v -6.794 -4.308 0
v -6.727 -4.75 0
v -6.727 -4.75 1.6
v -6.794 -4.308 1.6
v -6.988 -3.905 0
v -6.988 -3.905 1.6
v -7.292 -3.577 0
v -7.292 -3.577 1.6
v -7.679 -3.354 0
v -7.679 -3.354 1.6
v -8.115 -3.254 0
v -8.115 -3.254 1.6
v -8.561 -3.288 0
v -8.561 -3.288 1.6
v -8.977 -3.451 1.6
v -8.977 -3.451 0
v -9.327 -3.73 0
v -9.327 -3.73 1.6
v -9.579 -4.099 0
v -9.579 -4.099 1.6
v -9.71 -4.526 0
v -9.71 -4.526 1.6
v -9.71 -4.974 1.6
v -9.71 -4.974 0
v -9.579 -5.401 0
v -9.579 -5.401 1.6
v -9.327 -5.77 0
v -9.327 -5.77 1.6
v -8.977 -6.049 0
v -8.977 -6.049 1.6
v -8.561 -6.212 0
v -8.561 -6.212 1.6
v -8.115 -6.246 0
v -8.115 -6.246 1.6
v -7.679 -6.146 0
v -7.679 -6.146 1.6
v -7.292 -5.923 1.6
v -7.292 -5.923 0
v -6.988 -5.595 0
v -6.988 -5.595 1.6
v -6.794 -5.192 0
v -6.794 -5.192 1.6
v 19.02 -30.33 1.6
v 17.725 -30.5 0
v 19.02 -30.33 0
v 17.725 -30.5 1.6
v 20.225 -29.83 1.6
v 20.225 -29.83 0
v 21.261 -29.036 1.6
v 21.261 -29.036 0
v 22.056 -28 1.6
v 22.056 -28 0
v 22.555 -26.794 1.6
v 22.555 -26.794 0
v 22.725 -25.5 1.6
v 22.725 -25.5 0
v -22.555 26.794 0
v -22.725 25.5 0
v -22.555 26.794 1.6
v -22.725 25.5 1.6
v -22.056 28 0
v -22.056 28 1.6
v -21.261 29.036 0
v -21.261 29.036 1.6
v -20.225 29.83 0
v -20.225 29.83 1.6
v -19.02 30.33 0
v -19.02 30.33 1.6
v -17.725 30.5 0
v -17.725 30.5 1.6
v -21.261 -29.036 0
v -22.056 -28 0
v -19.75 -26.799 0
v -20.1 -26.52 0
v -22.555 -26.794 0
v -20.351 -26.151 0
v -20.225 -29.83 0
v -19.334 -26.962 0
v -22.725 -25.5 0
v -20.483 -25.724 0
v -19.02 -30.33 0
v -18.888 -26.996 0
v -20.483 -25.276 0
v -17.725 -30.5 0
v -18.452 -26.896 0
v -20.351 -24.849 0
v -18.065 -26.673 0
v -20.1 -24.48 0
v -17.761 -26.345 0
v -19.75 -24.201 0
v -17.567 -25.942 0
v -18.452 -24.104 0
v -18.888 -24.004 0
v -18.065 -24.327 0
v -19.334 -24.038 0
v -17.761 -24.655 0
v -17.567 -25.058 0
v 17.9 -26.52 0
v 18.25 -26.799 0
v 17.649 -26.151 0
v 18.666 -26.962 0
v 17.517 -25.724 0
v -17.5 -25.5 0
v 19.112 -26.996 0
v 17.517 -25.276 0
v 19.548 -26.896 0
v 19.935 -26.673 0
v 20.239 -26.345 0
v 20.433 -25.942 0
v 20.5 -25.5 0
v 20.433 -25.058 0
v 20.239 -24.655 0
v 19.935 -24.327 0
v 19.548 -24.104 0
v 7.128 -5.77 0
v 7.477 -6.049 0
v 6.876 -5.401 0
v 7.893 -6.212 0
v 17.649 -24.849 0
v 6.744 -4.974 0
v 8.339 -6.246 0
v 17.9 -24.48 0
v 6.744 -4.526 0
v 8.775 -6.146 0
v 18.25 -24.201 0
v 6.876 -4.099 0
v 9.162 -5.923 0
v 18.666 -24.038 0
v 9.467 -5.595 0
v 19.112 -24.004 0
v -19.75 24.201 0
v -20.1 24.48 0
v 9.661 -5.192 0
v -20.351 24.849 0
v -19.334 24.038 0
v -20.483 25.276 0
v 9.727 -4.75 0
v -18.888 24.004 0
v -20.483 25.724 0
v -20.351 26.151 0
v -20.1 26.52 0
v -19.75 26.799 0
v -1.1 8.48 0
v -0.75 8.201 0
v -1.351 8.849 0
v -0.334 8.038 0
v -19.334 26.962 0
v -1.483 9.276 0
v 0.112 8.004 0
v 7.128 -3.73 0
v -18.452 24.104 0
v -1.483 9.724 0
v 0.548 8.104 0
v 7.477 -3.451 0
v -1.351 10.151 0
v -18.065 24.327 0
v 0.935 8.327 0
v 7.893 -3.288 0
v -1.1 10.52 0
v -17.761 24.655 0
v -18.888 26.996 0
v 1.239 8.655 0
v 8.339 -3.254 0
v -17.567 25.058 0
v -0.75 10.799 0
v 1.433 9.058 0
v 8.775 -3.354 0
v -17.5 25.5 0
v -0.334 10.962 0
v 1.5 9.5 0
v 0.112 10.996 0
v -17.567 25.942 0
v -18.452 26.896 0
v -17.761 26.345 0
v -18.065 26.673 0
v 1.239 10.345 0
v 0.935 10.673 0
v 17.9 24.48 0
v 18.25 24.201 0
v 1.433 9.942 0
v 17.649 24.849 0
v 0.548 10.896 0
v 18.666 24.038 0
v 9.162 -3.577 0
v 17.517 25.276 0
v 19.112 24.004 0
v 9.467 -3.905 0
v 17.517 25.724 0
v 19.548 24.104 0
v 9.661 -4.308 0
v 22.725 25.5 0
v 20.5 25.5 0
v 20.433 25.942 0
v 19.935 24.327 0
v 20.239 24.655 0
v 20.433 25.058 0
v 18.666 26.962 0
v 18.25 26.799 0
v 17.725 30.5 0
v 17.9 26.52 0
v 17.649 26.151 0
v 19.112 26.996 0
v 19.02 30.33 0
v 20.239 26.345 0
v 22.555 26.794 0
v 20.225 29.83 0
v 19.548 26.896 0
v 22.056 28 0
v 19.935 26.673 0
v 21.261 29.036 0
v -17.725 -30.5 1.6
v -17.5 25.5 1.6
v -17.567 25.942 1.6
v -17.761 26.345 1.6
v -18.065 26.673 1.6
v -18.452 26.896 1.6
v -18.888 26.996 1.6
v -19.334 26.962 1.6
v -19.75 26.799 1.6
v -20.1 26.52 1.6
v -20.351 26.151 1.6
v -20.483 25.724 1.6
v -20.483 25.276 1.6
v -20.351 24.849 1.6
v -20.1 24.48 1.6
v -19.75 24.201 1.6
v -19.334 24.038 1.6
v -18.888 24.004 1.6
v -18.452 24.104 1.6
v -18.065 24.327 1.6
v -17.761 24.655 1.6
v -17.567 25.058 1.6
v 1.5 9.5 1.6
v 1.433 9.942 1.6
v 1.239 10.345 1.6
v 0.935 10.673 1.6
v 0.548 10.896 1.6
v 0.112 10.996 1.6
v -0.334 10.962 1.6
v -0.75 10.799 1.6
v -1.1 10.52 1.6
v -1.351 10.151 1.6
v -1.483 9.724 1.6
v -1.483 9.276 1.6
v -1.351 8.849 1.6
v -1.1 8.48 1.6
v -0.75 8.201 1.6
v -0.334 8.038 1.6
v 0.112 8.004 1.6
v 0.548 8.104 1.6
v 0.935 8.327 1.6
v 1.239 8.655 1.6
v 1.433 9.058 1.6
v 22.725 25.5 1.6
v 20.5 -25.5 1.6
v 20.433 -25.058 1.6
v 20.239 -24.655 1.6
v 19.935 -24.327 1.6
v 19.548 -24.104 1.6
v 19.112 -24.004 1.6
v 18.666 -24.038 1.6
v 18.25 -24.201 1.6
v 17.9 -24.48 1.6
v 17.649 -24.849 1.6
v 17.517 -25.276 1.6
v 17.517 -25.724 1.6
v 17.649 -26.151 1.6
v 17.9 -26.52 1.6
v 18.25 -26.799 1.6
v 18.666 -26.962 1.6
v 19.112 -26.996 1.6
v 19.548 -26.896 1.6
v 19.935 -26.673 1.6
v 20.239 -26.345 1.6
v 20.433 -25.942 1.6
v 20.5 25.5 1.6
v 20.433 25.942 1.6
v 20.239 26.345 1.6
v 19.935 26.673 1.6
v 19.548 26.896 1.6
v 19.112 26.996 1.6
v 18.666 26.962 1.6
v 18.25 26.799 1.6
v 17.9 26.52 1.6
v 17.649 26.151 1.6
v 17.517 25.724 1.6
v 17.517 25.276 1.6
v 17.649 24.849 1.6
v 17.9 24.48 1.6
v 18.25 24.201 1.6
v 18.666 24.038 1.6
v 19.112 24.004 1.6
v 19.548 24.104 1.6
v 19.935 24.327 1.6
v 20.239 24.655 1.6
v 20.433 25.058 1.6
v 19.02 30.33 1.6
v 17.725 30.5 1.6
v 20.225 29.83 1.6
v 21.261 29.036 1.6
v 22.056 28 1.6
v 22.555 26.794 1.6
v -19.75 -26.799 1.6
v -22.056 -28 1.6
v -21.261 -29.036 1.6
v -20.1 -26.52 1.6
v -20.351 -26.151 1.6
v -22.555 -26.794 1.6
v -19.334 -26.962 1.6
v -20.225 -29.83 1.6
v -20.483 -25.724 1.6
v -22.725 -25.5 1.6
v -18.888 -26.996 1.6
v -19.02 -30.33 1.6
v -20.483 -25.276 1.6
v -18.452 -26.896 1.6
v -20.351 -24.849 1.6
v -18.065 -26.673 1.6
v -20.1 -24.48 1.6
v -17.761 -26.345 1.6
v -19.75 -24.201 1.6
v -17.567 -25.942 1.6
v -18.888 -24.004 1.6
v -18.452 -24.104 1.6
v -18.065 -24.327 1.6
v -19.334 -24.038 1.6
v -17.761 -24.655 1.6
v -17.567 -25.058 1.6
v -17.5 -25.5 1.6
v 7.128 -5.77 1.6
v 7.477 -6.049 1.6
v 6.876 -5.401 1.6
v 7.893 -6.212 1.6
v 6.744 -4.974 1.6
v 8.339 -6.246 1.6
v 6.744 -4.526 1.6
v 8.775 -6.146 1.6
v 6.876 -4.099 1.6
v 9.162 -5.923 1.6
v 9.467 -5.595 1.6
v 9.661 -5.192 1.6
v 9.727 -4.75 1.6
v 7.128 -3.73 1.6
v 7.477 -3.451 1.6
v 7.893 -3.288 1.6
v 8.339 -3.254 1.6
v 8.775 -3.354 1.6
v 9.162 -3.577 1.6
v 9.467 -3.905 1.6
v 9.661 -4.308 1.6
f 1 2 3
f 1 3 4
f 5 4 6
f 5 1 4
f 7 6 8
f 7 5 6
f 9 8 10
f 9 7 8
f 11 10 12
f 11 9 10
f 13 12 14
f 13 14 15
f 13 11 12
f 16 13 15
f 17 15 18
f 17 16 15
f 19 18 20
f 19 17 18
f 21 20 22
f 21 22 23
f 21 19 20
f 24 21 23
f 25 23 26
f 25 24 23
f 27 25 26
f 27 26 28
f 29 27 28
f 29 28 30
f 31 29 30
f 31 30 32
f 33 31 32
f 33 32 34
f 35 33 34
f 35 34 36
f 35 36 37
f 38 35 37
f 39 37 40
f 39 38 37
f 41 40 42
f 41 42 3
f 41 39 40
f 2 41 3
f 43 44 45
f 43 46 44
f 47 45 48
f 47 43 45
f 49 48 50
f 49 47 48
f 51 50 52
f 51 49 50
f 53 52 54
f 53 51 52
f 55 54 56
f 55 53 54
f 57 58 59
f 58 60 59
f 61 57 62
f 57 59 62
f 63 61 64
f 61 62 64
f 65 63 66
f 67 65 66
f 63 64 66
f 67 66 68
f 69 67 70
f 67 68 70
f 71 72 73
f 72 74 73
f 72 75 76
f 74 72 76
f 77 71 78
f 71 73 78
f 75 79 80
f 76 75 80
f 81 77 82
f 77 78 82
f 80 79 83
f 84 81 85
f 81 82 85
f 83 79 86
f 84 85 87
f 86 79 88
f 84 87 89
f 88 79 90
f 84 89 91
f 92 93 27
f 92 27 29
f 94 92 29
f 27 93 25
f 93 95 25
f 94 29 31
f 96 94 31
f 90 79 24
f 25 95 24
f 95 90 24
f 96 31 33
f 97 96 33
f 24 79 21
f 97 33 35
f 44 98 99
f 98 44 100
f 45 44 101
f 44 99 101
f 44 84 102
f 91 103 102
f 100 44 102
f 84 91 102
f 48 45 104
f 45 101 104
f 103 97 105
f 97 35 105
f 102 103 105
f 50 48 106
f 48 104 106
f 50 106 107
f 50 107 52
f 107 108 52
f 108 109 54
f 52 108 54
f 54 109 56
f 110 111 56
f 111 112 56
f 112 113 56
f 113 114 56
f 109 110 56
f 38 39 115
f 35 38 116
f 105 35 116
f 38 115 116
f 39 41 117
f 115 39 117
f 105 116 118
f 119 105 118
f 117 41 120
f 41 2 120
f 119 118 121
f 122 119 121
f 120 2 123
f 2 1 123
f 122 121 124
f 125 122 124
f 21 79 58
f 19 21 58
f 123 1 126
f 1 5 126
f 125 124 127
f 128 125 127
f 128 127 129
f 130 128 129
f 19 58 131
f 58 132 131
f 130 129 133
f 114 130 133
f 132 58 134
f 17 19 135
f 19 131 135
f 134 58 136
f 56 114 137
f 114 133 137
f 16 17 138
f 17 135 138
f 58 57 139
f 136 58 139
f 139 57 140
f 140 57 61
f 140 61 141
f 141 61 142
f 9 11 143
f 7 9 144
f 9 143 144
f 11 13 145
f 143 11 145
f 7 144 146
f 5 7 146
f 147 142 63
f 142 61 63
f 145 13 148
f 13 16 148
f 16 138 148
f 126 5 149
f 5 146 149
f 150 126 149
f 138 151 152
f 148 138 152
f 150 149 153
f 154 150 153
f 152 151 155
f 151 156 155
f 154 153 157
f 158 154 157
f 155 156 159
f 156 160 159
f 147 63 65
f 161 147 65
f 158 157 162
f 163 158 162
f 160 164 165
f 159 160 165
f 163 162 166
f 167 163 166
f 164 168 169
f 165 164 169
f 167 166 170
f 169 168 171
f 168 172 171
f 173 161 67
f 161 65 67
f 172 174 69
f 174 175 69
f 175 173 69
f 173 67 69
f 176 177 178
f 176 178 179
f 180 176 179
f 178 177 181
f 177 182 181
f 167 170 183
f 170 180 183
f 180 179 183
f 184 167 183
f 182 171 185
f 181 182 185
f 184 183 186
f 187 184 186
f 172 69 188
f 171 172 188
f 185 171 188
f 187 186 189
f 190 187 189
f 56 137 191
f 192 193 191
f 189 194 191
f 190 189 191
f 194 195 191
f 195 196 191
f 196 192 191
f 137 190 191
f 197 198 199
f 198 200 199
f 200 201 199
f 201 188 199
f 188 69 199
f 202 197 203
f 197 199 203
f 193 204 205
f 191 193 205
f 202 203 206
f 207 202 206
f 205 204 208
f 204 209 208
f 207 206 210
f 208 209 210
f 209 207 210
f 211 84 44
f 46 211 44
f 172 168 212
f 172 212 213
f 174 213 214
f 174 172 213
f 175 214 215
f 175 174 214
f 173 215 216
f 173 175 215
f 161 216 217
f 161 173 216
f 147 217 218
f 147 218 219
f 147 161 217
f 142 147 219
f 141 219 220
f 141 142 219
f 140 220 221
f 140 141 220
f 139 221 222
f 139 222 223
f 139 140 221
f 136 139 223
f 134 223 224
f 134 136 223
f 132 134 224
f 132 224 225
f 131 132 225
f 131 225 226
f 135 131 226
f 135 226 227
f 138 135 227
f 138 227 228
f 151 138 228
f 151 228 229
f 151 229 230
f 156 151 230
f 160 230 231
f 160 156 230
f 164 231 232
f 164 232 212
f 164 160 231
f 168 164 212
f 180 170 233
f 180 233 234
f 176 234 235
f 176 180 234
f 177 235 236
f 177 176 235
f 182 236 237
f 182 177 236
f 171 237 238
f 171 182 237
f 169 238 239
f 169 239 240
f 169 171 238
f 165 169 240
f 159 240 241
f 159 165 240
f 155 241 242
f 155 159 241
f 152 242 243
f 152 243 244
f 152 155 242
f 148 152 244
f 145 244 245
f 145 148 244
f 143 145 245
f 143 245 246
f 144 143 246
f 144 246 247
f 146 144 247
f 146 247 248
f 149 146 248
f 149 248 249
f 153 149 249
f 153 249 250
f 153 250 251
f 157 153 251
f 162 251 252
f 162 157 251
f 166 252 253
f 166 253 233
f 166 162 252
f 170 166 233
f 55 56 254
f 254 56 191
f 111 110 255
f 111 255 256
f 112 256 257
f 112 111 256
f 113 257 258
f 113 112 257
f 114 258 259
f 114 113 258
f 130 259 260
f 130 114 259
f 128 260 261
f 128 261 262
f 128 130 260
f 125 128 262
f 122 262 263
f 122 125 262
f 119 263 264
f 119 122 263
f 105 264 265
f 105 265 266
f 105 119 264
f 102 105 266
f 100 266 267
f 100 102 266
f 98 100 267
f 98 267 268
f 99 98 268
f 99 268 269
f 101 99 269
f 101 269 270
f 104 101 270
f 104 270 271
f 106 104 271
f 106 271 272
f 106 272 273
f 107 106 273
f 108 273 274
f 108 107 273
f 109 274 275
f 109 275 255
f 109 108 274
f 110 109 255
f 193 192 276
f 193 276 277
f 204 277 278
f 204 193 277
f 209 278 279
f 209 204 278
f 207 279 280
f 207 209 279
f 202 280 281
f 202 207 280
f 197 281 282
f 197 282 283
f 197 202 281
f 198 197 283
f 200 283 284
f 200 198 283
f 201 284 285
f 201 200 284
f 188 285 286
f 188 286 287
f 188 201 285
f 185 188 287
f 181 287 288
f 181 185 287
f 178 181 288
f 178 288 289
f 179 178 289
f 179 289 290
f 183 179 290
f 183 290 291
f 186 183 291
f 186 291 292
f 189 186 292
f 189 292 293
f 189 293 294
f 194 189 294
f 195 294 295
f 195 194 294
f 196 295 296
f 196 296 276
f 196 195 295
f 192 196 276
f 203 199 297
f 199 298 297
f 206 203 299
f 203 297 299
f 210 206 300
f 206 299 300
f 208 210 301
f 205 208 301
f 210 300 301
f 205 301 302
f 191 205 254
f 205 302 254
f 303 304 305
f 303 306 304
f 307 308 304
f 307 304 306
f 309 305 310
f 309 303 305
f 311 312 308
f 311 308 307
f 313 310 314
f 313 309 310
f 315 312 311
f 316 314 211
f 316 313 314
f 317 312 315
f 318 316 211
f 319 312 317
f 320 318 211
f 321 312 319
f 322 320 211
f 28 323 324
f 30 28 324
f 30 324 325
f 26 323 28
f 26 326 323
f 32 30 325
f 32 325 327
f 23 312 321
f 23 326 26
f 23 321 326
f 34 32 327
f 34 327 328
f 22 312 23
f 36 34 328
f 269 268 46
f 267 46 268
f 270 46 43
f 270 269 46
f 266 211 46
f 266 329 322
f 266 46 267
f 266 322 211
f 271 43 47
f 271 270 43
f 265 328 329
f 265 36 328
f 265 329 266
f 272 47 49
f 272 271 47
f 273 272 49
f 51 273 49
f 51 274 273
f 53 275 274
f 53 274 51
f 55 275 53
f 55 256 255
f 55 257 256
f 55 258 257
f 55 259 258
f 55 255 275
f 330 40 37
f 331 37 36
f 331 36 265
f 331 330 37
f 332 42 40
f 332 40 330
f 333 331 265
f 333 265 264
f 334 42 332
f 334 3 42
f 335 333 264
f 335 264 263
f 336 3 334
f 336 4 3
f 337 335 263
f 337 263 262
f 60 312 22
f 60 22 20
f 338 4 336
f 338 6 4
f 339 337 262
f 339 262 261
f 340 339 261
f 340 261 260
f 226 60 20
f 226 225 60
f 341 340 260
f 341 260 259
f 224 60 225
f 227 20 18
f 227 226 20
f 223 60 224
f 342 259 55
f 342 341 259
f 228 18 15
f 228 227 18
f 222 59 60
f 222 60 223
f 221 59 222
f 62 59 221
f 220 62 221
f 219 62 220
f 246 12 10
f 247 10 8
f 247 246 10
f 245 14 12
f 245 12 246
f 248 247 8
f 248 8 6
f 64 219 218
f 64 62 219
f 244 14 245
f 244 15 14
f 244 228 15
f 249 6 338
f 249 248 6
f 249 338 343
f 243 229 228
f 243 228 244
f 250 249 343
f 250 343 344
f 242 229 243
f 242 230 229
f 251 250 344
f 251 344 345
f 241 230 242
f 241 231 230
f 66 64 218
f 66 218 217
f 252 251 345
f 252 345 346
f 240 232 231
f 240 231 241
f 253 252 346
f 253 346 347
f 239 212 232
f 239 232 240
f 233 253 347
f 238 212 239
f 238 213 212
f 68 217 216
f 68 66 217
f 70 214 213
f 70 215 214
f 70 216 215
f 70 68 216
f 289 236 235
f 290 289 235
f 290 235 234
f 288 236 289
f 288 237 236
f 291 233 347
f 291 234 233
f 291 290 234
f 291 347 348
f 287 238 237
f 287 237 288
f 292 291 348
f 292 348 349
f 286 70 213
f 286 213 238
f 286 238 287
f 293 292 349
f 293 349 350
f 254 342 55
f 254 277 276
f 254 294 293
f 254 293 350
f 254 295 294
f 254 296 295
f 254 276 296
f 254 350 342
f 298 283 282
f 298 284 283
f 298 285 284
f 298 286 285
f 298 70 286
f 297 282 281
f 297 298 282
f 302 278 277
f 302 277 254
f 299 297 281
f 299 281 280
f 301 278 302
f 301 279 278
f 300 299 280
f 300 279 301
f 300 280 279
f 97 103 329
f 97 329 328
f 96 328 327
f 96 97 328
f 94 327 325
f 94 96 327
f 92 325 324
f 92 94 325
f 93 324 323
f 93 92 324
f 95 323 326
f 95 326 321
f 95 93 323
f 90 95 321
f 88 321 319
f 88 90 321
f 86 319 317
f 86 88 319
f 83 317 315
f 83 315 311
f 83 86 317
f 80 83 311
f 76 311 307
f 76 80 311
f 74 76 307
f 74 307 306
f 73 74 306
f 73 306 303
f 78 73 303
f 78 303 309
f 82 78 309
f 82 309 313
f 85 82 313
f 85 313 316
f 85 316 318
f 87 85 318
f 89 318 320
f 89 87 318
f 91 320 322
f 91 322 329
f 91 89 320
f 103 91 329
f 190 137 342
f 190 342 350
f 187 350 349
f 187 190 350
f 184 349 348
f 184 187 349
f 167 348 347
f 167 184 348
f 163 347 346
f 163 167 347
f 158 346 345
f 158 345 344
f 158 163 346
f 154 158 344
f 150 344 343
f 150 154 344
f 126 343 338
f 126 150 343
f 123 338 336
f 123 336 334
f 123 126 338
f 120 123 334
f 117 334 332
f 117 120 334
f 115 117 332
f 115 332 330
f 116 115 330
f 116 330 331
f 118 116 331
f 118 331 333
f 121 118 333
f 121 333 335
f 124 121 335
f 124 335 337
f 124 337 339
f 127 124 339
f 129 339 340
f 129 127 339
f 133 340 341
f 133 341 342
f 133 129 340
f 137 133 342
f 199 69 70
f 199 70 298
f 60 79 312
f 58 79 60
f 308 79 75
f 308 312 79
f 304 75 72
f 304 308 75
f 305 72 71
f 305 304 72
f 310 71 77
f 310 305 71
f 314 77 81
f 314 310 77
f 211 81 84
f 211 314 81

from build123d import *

# Parameters (mm, degrees)
SKETCH_1_W      = 45.450980392
SKETCH_1_H      = 61
SKETCH_1_R      = 1.5
EXTRUDE_1_DEPTH = 1.6
FILLET_1_R      = 5


with BuildPart() as part:
    # 草图1 → 凸台-拉伸1 (new body)
    with BuildSketch(Plane.XY):
        Rectangle(SKETCH_1_W, SKETCH_1_H)
        with Locations((19, -25.5)):
            Circle(SKETCH_1_R, mode=Mode.SUBTRACT)
        with Locations((-19, -25.5)):
            Circle(SKETCH_1_R, mode=Mode.SUBTRACT)
        with Locations((-19, 25.5)):
            Circle(SKETCH_1_R, mode=Mode.SUBTRACT)
        with Locations((19, 25.5)):
            Circle(SKETCH_1_R, mode=Mode.SUBTRACT)
        with Locations((-8.227241336, -4.75)):
            Circle(SKETCH_1_R, mode=Mode.SUBTRACT)
        with Locations((8.227241336, -4.75)):
            Circle(SKETCH_1_R, mode=Mode.SUBTRACT)
        with Locations((0, 9.5)):
            Circle(SKETCH_1_R, mode=Mode.SUBTRACT)
    extrude(amount=EXTRUDE_1_DEPTH)

    # 圆角1
    fillet_1_edges = [part.edges().sort_by_distance(p)[0] for p in [
        (22.725490196, -30.5, 0.8),
        (-22.725490196, -30.5, 0.8),
        (-22.725490196, 30.5, 0.8),
        (22.725490196, 30.5, 0.8),
    ]]
    fillet(fillet_1_edges, radius=FILLET_1_R)


solid = part.part
